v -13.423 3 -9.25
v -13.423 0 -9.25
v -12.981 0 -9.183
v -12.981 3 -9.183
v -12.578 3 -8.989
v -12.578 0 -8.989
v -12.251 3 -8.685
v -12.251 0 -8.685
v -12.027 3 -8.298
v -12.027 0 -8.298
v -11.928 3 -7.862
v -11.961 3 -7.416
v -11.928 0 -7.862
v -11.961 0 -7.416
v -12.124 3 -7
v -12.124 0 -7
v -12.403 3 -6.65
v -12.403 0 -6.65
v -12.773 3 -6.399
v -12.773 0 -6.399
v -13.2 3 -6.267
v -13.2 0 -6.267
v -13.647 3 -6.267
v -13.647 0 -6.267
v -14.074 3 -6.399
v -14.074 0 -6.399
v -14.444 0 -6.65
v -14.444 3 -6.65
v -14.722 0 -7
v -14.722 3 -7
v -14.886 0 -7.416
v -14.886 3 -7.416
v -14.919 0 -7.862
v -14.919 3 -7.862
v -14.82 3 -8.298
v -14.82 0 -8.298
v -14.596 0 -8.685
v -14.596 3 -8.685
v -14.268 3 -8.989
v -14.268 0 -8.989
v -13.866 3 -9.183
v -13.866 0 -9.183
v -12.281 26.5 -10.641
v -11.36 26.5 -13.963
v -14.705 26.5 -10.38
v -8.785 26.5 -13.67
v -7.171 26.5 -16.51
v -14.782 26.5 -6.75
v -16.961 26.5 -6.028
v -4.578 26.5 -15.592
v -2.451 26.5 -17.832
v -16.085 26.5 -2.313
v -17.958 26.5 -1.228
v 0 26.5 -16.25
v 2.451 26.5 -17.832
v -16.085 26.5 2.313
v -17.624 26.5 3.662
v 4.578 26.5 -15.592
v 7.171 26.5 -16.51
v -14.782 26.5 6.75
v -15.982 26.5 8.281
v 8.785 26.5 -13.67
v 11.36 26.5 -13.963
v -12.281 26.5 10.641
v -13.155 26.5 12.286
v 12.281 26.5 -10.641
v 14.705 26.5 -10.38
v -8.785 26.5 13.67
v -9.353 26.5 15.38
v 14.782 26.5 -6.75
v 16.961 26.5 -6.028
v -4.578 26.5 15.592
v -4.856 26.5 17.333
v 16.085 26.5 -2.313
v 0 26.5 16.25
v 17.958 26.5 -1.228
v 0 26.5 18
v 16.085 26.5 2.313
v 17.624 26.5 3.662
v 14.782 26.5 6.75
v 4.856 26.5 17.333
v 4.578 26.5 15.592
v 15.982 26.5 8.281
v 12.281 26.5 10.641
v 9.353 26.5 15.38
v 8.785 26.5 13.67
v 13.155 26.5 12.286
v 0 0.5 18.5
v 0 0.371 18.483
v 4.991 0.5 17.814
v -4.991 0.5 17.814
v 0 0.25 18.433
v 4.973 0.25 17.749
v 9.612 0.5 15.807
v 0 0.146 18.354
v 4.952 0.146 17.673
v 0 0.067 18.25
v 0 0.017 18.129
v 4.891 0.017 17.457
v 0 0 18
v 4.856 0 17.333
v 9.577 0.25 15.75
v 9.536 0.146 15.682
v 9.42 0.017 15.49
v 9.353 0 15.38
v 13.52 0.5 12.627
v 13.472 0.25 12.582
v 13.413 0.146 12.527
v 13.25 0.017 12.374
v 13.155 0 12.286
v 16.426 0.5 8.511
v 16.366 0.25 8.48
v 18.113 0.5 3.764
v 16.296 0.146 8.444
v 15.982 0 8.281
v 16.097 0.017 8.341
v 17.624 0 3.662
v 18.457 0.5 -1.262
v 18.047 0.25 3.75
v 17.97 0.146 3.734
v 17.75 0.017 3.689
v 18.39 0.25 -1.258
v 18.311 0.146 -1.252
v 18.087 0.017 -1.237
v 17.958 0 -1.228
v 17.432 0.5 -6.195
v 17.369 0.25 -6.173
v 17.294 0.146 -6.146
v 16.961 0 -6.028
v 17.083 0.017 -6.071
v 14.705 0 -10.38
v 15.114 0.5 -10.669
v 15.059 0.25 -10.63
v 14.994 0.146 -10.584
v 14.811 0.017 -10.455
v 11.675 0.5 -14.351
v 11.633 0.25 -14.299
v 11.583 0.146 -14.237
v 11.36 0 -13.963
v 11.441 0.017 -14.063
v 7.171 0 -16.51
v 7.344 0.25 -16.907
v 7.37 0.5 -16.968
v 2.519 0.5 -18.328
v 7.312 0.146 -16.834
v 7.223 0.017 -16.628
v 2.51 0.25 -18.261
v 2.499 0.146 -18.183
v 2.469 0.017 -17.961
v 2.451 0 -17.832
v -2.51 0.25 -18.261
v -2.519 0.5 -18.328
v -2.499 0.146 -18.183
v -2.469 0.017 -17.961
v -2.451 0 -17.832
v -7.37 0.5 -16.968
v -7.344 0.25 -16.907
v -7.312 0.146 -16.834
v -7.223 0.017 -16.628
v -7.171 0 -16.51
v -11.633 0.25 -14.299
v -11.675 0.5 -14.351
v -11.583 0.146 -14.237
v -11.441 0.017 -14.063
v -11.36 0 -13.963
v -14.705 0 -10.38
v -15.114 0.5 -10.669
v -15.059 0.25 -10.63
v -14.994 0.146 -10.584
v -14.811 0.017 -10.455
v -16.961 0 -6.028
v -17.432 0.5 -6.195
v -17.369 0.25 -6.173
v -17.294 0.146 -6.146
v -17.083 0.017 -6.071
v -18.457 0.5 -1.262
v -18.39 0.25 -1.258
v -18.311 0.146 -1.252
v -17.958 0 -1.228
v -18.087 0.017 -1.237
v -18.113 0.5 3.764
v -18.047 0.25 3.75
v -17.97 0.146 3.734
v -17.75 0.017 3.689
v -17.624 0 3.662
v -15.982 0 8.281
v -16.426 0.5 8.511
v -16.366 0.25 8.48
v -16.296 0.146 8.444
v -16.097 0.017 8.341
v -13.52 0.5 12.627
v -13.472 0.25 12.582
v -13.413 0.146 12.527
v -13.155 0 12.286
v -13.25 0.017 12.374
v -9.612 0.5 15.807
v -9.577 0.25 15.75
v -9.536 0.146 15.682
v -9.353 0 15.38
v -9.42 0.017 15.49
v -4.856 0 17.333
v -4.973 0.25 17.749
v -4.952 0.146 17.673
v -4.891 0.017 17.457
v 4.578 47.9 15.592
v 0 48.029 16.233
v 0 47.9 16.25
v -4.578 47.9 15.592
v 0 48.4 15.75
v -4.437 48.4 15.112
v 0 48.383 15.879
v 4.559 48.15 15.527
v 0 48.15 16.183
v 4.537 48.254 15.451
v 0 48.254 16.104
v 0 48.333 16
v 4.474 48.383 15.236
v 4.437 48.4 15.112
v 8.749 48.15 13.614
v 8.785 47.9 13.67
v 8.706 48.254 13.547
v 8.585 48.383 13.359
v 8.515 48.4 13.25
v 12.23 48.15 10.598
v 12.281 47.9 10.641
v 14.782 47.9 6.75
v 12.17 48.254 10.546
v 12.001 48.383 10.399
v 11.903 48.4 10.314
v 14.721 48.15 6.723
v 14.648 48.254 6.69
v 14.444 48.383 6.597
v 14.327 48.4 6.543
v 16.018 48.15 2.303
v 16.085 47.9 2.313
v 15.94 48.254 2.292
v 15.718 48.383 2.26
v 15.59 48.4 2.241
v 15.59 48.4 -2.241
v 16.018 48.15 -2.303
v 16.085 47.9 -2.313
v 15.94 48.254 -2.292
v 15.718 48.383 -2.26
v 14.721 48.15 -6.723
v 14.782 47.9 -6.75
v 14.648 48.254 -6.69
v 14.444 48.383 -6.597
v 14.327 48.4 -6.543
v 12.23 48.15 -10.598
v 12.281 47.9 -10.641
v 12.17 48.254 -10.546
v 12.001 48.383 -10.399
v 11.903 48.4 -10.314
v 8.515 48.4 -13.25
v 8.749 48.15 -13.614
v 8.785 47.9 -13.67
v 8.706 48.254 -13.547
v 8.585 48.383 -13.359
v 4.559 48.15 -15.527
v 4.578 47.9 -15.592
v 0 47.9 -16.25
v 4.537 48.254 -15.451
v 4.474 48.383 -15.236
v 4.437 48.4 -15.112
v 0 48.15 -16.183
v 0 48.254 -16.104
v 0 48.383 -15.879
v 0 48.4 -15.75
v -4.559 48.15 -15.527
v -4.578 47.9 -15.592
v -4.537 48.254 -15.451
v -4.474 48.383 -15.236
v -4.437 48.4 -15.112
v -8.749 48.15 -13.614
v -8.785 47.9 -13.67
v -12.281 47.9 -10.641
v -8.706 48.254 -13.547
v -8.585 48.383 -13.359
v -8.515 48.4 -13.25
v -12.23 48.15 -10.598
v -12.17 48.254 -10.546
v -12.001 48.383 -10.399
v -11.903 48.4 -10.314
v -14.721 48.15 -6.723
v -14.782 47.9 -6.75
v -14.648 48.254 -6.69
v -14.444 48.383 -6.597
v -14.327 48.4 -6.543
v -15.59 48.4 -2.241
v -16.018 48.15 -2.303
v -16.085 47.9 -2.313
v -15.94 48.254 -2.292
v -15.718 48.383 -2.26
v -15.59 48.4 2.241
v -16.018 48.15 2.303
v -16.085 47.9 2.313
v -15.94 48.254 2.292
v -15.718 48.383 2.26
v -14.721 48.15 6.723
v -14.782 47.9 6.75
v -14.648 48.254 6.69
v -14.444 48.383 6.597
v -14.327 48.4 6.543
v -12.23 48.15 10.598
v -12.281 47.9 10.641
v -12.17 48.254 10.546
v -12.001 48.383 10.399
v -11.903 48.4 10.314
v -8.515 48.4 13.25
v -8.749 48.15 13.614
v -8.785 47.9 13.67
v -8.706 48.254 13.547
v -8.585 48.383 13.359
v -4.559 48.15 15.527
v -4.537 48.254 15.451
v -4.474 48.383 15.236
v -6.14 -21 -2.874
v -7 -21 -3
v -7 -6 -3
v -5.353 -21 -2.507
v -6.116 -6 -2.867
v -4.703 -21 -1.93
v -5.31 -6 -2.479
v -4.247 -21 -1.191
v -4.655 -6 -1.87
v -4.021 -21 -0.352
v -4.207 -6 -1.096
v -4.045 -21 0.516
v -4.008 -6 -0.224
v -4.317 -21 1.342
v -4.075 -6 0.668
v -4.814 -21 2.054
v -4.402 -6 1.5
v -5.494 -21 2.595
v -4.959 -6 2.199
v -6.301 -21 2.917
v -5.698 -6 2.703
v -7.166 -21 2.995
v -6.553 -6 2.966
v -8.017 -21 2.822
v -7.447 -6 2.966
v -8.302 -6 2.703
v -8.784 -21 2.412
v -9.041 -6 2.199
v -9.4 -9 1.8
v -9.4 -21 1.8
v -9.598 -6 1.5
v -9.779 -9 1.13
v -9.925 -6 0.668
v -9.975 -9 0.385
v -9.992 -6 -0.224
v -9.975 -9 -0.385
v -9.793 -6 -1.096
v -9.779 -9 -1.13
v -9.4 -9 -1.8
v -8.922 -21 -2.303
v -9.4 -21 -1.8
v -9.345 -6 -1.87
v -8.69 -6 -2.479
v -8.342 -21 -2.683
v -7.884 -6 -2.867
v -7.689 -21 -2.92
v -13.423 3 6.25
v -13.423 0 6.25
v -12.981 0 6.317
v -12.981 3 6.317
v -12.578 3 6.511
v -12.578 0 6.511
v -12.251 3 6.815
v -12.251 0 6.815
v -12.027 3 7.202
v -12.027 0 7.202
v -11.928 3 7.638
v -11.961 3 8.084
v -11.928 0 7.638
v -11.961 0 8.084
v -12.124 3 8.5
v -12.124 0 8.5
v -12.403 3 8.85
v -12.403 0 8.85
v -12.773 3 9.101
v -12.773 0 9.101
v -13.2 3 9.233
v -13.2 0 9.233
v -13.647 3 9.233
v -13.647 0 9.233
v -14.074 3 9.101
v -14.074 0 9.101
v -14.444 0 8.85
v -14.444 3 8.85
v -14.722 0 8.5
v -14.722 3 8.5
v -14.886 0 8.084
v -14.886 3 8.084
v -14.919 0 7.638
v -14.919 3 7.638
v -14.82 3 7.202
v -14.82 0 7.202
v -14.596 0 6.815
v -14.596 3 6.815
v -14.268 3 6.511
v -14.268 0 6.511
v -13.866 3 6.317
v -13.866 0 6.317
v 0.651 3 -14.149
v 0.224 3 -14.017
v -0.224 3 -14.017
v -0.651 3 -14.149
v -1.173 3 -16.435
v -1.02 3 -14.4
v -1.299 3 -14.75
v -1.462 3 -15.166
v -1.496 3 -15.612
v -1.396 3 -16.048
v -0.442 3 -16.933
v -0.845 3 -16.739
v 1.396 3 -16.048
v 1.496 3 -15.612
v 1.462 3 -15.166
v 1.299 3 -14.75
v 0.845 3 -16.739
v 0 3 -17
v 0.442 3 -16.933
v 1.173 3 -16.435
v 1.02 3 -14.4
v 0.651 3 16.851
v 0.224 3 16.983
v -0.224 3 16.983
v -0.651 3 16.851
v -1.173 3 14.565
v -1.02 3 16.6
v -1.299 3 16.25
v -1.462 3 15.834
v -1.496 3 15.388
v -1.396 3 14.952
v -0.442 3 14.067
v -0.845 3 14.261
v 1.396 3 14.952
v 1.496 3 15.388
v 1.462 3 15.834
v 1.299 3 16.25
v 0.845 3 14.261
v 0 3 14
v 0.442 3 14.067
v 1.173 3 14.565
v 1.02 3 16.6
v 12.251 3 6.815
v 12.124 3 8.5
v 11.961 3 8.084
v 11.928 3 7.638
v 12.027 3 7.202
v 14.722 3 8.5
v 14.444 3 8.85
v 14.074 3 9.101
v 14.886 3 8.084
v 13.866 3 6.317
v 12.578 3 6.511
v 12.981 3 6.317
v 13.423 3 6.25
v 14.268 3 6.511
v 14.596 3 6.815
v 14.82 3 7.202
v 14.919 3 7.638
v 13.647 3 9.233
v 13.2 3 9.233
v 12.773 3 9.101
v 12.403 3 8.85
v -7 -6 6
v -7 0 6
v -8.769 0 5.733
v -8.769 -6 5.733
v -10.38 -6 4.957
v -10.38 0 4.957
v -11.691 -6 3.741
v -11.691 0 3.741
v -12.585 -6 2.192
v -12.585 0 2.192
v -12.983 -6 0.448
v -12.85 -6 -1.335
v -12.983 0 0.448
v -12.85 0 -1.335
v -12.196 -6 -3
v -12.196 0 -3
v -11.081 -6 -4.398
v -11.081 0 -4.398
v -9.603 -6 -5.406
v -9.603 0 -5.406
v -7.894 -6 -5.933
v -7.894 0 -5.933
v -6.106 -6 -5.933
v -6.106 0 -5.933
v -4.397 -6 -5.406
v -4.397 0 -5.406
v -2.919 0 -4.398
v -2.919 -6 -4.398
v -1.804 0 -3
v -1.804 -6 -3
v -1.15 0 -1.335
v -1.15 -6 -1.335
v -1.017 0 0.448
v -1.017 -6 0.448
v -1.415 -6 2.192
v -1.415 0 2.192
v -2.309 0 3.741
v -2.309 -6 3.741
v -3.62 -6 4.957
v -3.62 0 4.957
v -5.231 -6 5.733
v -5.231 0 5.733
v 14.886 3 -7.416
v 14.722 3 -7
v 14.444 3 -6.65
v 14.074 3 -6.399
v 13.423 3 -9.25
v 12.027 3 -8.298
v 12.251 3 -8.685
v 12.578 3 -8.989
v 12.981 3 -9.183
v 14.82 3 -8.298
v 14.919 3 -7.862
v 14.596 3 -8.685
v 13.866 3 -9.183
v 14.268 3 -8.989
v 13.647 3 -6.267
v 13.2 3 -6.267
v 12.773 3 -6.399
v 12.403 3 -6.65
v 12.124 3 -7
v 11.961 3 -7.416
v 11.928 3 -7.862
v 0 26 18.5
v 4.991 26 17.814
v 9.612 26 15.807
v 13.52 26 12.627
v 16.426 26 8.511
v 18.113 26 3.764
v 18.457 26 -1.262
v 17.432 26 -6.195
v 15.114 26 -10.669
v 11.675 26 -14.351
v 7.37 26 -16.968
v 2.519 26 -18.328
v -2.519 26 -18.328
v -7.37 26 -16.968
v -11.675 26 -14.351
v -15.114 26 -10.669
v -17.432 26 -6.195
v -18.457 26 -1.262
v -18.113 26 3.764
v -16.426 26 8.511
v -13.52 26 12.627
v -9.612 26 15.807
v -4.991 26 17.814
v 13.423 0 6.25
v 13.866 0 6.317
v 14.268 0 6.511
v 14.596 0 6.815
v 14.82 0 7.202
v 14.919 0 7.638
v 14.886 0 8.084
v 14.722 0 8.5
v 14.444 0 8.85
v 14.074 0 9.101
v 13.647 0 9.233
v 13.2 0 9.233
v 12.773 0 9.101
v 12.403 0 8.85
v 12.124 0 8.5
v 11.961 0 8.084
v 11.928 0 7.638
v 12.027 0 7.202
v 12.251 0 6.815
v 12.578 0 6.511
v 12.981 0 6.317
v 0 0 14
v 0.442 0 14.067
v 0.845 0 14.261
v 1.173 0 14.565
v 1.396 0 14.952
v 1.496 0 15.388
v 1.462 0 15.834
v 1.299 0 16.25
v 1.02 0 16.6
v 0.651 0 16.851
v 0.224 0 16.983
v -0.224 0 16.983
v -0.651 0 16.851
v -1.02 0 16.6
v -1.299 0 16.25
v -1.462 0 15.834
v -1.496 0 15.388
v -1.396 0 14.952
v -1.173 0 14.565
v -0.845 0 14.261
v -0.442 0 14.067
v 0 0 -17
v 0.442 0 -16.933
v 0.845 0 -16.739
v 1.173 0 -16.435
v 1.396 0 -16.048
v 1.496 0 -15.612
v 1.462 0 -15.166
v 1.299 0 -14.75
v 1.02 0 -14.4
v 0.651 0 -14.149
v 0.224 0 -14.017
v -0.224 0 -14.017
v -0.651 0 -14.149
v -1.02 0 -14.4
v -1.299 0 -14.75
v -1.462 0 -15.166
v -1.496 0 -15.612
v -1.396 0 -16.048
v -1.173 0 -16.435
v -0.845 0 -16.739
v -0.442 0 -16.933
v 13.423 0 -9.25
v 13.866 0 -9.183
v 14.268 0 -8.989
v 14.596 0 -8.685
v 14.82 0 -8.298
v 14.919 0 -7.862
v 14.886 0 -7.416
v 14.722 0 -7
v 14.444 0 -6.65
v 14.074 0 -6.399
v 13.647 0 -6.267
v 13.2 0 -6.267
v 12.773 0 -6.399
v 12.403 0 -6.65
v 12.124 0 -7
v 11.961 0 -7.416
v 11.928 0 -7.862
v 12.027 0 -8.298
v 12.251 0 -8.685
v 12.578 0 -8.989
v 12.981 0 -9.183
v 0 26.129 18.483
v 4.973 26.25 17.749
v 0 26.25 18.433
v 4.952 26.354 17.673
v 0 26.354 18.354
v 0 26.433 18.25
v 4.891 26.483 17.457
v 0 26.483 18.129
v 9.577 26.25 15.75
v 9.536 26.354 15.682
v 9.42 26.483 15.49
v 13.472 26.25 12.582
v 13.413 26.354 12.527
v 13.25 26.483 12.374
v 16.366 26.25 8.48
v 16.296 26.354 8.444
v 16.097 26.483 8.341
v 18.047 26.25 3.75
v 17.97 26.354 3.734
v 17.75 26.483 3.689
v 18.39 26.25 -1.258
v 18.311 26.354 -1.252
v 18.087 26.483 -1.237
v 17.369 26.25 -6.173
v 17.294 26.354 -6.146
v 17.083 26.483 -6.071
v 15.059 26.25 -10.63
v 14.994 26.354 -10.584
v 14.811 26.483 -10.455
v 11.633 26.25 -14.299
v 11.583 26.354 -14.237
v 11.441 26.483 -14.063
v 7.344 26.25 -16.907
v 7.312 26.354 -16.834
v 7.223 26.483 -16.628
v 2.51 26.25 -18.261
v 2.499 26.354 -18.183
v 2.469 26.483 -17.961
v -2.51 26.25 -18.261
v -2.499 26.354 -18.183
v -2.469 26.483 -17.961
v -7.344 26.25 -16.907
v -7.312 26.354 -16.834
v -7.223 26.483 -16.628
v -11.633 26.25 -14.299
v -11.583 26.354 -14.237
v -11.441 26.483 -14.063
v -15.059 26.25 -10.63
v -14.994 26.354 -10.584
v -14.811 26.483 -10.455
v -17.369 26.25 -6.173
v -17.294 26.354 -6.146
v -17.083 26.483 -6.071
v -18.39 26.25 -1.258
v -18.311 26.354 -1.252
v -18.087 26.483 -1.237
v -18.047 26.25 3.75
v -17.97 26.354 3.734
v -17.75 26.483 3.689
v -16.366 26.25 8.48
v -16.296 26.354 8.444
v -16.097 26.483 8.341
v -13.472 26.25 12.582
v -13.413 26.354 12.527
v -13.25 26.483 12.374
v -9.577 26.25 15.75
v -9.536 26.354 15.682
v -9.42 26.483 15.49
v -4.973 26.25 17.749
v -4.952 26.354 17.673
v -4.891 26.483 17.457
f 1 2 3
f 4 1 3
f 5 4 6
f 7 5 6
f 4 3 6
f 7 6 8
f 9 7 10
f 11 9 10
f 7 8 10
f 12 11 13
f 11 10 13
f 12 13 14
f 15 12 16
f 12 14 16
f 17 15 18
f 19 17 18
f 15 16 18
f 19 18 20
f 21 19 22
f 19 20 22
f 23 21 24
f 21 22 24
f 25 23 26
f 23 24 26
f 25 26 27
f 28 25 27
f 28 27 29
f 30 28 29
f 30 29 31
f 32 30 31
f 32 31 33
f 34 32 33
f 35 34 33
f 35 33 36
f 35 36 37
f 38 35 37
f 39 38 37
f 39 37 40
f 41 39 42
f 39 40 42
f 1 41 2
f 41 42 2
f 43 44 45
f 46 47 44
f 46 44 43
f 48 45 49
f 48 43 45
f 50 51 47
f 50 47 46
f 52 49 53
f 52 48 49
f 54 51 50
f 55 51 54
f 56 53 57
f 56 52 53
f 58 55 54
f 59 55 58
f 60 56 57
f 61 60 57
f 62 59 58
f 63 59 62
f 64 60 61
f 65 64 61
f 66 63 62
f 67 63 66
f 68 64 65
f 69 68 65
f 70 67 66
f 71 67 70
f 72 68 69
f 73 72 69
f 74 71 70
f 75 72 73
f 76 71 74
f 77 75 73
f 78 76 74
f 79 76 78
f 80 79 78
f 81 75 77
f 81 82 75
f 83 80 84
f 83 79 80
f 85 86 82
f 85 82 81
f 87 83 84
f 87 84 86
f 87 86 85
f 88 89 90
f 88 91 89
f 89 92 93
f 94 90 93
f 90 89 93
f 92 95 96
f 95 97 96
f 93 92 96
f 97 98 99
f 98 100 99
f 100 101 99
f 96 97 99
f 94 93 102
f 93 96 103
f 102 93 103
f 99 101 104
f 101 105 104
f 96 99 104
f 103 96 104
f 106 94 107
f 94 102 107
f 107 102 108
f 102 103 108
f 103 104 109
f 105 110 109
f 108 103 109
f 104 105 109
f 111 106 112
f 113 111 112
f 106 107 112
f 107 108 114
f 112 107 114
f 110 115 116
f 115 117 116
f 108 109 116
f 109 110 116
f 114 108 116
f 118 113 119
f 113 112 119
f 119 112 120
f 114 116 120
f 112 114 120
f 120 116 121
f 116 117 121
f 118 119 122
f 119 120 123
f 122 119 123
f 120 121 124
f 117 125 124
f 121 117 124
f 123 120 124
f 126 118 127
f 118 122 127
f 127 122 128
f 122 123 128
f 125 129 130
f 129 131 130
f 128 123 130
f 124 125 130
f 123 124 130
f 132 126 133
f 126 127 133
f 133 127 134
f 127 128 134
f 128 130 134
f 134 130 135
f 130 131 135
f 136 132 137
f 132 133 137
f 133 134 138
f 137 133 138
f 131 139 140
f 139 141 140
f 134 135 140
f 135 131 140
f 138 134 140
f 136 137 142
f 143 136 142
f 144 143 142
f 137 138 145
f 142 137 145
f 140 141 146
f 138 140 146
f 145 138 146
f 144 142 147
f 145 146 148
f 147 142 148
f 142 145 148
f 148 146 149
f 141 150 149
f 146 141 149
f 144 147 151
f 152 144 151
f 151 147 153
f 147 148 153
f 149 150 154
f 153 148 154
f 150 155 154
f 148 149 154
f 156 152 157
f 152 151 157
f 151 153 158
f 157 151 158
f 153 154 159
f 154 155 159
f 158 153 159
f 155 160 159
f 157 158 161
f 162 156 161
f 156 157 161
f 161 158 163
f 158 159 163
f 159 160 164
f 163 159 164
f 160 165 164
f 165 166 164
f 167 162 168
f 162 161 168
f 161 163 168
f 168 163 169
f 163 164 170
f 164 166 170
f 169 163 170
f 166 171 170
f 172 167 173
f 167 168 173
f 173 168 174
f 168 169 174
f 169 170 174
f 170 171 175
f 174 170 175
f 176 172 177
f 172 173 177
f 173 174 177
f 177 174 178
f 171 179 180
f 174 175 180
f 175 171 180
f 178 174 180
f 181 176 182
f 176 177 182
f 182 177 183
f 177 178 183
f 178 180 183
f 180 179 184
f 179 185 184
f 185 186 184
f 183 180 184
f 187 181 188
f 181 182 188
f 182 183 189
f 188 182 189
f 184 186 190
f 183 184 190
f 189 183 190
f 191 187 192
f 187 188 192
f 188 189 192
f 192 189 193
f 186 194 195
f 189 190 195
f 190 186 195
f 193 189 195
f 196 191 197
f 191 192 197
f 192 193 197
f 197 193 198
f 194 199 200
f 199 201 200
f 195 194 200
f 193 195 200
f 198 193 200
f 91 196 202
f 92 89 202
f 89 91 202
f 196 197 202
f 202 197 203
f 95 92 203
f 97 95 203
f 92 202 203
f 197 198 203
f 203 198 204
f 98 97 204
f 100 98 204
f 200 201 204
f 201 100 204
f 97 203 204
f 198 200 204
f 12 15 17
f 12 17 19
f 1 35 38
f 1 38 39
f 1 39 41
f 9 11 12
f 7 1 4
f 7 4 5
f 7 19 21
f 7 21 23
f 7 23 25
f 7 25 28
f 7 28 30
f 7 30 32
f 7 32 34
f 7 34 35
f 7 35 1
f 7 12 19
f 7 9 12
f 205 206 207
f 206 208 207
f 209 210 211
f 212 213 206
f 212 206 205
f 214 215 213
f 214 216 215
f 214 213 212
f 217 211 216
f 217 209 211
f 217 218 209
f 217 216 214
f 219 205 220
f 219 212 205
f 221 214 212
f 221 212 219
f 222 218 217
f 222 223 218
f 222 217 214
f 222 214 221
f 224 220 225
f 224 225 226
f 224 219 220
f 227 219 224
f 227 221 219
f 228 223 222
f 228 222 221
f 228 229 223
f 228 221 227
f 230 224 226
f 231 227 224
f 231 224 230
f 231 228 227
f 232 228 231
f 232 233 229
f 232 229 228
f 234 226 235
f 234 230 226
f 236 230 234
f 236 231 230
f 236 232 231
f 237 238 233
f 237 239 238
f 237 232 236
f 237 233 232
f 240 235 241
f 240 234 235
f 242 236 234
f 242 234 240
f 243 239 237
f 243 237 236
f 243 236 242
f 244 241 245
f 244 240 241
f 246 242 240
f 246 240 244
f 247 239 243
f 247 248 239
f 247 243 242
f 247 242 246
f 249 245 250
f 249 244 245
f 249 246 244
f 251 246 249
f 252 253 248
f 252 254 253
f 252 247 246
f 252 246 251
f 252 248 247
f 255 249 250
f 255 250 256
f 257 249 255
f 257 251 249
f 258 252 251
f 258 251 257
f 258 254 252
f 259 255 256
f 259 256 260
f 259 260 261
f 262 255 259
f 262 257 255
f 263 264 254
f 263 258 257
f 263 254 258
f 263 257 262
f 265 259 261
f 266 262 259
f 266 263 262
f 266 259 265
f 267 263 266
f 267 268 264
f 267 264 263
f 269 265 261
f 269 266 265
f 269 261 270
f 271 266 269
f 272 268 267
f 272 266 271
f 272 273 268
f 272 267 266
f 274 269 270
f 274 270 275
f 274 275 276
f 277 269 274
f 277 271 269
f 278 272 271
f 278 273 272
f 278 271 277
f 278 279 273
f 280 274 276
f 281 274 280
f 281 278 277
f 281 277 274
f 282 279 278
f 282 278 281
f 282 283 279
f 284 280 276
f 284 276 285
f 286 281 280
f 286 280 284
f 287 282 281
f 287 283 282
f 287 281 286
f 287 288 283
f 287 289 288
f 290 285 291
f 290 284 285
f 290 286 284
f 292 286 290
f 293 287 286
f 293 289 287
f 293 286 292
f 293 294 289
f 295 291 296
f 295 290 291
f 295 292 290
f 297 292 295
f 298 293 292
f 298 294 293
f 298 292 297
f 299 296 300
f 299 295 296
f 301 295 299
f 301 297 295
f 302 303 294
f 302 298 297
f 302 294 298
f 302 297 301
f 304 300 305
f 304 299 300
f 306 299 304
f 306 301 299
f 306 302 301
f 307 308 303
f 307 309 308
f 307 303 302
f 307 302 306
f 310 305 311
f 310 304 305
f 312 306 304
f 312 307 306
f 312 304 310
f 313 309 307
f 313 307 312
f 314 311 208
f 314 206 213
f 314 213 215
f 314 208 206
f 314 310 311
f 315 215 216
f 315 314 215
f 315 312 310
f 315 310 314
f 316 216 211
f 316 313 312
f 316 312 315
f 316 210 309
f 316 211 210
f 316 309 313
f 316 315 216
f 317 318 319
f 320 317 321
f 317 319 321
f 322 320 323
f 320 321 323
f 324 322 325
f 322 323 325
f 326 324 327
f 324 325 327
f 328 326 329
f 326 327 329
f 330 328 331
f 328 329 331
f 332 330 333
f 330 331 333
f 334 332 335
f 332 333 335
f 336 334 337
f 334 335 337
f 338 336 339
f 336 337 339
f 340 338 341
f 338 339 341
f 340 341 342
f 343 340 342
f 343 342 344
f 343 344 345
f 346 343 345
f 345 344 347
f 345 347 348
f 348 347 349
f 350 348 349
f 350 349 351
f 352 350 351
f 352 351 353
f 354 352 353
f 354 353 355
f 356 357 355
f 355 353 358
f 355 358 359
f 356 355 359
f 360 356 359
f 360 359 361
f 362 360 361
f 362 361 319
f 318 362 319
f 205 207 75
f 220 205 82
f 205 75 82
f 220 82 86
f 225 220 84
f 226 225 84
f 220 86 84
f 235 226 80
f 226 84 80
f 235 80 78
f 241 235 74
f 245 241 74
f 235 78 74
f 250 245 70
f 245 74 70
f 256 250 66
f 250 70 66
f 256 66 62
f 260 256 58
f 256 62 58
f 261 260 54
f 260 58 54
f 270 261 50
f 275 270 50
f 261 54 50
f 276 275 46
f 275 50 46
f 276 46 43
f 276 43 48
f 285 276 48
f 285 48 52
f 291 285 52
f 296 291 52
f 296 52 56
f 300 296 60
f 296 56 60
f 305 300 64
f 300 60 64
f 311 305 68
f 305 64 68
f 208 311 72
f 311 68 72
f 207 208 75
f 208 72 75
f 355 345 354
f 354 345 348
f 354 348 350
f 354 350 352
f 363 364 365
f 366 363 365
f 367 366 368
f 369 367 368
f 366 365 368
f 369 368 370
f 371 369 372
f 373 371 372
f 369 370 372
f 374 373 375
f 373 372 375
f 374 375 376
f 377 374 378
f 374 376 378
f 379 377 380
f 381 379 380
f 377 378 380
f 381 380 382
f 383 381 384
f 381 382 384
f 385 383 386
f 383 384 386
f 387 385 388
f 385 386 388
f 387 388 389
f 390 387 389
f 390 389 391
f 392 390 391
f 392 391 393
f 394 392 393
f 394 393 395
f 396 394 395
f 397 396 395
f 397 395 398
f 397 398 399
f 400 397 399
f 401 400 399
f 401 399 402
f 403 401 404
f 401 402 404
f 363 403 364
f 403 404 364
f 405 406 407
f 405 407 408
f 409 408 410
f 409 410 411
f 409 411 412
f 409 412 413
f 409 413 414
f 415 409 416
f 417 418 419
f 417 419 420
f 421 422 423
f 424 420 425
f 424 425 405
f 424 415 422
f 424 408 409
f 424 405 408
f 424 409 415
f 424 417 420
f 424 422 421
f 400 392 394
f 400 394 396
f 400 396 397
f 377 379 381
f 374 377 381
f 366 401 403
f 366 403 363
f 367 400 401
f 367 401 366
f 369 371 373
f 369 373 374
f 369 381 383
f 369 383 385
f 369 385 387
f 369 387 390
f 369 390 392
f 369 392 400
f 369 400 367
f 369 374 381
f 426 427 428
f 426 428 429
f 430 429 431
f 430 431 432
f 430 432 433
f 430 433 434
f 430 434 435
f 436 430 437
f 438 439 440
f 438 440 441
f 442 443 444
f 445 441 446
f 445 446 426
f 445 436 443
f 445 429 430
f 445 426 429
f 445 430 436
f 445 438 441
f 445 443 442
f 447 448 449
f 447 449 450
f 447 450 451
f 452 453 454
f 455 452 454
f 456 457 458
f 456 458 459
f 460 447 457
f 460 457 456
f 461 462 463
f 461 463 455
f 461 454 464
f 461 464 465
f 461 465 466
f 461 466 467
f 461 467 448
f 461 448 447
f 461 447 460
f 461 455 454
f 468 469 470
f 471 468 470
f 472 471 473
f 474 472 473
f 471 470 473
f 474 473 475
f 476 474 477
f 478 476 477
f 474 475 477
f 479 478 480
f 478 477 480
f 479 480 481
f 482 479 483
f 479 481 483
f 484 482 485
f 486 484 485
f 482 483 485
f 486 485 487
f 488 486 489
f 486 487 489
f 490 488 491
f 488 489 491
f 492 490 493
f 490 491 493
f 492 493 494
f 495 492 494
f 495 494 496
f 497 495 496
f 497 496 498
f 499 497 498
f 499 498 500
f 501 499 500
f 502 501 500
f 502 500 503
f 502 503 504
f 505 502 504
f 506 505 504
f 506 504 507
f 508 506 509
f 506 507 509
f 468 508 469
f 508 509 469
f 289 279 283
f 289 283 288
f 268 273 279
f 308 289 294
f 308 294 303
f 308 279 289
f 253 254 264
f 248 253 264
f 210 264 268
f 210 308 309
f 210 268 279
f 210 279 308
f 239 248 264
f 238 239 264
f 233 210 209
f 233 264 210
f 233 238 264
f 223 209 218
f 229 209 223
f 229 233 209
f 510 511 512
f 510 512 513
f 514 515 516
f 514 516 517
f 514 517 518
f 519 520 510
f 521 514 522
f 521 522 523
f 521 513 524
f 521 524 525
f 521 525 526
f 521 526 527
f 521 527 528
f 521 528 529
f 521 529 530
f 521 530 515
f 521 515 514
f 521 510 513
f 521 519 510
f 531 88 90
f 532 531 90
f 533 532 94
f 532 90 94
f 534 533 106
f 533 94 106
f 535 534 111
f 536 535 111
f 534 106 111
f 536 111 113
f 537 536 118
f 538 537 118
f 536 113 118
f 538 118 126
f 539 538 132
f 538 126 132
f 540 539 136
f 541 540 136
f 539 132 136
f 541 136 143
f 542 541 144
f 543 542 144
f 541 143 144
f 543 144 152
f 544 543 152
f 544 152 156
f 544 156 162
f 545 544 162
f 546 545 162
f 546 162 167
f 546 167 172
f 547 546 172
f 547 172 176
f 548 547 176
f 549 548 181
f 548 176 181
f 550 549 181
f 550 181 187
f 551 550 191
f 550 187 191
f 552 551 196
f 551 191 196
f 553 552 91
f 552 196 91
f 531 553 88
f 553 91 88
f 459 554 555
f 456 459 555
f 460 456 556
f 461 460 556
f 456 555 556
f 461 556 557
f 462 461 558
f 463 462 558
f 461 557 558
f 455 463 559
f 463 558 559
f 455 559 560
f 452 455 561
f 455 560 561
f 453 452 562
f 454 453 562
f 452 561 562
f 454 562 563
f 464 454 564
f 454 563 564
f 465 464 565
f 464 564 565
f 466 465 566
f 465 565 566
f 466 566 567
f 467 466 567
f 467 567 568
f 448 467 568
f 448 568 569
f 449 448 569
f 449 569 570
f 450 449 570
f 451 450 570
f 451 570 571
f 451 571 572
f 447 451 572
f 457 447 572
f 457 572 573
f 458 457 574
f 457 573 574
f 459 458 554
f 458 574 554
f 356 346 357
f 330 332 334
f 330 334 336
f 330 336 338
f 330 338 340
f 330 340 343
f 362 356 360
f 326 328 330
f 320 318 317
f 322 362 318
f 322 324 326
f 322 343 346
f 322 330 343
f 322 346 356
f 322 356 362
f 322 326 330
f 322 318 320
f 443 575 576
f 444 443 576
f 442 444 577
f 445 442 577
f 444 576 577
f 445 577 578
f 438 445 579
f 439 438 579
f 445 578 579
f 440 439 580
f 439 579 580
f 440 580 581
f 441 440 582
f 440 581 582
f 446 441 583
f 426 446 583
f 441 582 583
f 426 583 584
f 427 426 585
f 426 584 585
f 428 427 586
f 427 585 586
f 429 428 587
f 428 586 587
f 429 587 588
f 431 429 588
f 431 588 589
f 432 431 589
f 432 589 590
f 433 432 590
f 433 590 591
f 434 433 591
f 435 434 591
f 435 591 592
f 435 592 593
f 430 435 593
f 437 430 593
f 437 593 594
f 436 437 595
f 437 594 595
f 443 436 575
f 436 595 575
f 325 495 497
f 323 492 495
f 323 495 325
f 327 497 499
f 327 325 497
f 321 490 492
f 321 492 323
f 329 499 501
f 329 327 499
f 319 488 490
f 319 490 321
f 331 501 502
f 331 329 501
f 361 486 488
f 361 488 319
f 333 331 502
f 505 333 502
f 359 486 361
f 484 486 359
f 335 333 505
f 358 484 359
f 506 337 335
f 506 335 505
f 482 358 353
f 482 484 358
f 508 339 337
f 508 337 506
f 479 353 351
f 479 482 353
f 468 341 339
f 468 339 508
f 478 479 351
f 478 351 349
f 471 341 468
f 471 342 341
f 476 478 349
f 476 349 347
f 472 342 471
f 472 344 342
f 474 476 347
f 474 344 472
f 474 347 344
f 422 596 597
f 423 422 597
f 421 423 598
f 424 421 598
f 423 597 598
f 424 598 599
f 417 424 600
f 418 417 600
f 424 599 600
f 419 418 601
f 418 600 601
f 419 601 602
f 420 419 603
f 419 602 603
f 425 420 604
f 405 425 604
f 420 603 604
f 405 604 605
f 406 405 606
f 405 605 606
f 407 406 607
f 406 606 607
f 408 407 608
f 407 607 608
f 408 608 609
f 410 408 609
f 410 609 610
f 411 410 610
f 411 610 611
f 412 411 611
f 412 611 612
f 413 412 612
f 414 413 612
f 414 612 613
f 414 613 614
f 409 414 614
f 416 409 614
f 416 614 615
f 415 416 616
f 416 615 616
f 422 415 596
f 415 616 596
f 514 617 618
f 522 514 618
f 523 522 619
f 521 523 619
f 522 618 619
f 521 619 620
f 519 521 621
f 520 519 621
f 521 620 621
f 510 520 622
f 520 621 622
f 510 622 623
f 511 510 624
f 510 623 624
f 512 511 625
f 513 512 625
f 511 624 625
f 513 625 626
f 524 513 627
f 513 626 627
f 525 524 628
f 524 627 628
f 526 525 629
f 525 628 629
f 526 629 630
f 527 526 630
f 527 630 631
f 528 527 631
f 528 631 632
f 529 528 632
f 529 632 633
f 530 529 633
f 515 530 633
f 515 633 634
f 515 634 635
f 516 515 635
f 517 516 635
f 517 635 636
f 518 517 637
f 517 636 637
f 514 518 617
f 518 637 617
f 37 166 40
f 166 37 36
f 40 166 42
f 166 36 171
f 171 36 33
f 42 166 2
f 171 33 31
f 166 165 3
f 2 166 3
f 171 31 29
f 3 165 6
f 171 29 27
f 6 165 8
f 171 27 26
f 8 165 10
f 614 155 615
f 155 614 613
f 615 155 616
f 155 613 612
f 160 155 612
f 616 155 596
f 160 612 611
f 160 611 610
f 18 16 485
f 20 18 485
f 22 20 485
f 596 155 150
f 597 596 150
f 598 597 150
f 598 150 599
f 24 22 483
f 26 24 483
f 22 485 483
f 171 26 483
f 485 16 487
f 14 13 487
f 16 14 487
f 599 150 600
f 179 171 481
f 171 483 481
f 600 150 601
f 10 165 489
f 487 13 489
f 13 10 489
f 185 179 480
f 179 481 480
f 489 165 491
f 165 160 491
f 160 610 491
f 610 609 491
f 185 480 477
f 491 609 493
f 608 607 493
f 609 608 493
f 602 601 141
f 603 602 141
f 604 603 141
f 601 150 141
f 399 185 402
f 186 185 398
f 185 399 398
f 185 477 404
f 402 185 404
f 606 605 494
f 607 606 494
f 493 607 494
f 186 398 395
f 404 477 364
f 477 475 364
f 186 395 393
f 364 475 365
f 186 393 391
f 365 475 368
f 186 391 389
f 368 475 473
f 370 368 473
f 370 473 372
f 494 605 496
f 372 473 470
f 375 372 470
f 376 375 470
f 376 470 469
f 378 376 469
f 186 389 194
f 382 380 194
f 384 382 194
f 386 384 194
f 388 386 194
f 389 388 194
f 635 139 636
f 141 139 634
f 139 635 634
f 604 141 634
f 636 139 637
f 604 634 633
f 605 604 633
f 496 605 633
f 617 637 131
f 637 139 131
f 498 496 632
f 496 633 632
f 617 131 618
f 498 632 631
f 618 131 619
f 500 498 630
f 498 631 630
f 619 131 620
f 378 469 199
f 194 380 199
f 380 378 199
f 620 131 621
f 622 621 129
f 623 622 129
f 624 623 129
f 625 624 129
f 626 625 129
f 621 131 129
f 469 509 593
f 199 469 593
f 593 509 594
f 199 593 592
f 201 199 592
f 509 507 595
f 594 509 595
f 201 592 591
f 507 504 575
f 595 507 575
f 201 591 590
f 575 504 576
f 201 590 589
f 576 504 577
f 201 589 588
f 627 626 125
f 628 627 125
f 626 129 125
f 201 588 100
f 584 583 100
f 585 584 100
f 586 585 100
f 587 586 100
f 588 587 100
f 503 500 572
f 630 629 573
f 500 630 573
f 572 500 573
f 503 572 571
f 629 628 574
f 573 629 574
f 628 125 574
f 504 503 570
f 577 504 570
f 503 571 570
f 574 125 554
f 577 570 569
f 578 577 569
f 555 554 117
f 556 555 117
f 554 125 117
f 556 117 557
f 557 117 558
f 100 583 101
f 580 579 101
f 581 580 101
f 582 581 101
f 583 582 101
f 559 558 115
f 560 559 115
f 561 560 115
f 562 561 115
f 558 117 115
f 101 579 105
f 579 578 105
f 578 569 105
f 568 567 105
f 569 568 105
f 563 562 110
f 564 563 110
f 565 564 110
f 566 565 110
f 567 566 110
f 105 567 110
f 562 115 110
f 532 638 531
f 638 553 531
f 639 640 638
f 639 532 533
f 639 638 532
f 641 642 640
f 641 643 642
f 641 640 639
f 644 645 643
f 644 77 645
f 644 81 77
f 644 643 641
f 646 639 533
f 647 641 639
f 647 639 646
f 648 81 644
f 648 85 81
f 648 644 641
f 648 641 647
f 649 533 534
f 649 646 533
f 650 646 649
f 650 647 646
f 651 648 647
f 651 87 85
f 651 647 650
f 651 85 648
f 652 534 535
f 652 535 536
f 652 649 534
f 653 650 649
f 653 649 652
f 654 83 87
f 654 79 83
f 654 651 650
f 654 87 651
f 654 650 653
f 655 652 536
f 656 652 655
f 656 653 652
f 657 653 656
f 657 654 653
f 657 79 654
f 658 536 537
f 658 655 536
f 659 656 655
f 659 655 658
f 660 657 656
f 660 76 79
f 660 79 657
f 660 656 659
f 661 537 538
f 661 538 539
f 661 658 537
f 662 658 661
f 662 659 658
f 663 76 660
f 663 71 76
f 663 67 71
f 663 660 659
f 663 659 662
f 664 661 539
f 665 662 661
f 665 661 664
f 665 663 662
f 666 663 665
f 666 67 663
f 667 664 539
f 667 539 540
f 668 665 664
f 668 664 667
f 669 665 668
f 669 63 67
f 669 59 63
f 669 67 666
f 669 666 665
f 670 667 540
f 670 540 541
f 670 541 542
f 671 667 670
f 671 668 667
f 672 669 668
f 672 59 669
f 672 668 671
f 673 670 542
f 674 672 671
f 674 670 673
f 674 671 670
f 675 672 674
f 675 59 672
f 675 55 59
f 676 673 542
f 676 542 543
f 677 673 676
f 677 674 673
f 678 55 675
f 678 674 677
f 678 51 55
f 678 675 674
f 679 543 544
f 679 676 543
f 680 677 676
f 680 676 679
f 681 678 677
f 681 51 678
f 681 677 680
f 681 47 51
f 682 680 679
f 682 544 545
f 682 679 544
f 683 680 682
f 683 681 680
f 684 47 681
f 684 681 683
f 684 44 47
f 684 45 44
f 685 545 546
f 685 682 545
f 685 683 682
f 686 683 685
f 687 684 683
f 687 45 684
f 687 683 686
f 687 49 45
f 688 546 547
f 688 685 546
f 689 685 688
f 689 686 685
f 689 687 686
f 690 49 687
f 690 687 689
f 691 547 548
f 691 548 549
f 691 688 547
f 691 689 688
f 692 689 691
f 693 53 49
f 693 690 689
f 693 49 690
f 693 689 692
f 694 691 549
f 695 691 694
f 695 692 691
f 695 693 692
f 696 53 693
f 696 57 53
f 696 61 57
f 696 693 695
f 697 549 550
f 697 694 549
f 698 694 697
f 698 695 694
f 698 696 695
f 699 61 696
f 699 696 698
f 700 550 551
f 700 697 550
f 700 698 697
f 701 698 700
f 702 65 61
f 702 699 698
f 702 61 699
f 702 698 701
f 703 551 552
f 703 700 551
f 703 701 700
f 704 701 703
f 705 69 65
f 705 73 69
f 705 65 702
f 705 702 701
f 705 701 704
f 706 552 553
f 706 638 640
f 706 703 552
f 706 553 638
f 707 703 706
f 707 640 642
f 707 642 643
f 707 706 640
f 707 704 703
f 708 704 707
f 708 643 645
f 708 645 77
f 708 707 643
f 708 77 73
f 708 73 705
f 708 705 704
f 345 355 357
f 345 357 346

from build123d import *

# Parameters (mm, degrees)
SKETCH_1_R          = 18.5
EXTRUDE_1_DEPTH     = 26.5
SKETCH_2_R          = 16.25
EXTRUDE_2_DEPTH     = 21.9
SKETCH_3_R          = 6
EXTRUDE_3_DEPTH     = 6
SKETCH_4_R          = 3
EXTRUDE_4_DEPTH     = 15
CUT_EXTRUDE_START   = -12
CUT_EXTRUDE_1_DEPTH = 12
FILLET_1_R          = 0.5
SKETCH_6_R          = 1.5
CUT_EXTRUDE_2_DEPTH = 3


with BuildPart() as part:
    # 草图1 → 凸台-拉伸1 (new body)
    with BuildSketch(Plane(origin=(0, 0, 0), x_dir=(1, 0, 0), z_dir=(0, 1, 0))):
        with Locations(Location((0, 0, 0), (0, 0, 270))):
            Circle(SKETCH_1_R)
    extrude(amount=EXTRUDE_1_DEPTH)

    # 草图2 → 凸台-拉伸2 (add)
    with BuildSketch(Plane(origin=(0, 26.5, 0), x_dir=(1, 0, 0), z_dir=(0, 1, 0))):
        with Locations(Location((0, 0, 0), (0, 0, 270))):
            Circle(SKETCH_2_R)
    extrude(amount=EXTRUDE_2_DEPTH)

    # 草图3 → 凸台-拉伸3 (add)
    with BuildSketch(Plane.XZ):
        with Locations(Location((-7, 0, 0), (0, 0, 90))):
            Circle(SKETCH_3_R)
    extrude(amount=EXTRUDE_3_DEPTH)

    # 草图4 → 凸台-拉伸4 (add)
    with BuildSketch(Plane.XZ.offset(6)):
        with Locations(Location((-7, 0, 0), (0, 0, 270))):
            Circle(SKETCH_4_R)
    extrude(amount=EXTRUDE_4_DEPTH)

    # 草图5 → 切除-拉伸1 (cut)
    with BuildSketch(Plane.XZ.offset(21).offset(CUT_EXTRUDE_START)):
        with BuildLine():
            Line((-9.4, -1.8), (-9.4, 1.8))
            ThreePointArc((-9.4, 1.8), (-10, 0), (-9.4, -1.8))
        make_face()
    extrude(amount=CUT_EXTRUDE_1_DEPTH, mode=Mode.SUBTRACT)

    # 圆角1
    fillet_1_edges = [part.edges().sort_by_distance(p)[0] for p in [
        (0, 0, -18.5),
        (0, 26.5, -18.5),
        (0, 48.4, -16.25),
    ]]
    fillet(fillet_1_edges, radius=FILLET_1_R)

    # 草图6 → 切除-拉伸2 (cut)
    with BuildSketch(Plane.XZ):
        with Locations(Location((0, -15.5, 0), (0, 0, 270))):
            Circle(SKETCH_6_R)
        with Locations(Location((-13.423393759, -7.75, 0), (0, 0, 270))):
            Circle(SKETCH_6_R)
        with Locations(Location((-13.423393759, 7.75, 0), (0, 0, 270))):
            Circle(SKETCH_6_R)
        with Locations(Location((0, 15.5, 0), (0, 0, 270))):
            Circle(SKETCH_6_R)
        with Locations(Location((13.423393759, 7.75, 0), (0, 0, 270))):
            Circle(SKETCH_6_R)
        with Locations(Location((13.423393759, -7.75, 0), (0, 0, 270))):
            Circle(SKETCH_6_R)
    extrude(amount=-CUT_EXTRUDE_2_DEPTH, mode=Mode.SUBTRACT)


solid = part.part
